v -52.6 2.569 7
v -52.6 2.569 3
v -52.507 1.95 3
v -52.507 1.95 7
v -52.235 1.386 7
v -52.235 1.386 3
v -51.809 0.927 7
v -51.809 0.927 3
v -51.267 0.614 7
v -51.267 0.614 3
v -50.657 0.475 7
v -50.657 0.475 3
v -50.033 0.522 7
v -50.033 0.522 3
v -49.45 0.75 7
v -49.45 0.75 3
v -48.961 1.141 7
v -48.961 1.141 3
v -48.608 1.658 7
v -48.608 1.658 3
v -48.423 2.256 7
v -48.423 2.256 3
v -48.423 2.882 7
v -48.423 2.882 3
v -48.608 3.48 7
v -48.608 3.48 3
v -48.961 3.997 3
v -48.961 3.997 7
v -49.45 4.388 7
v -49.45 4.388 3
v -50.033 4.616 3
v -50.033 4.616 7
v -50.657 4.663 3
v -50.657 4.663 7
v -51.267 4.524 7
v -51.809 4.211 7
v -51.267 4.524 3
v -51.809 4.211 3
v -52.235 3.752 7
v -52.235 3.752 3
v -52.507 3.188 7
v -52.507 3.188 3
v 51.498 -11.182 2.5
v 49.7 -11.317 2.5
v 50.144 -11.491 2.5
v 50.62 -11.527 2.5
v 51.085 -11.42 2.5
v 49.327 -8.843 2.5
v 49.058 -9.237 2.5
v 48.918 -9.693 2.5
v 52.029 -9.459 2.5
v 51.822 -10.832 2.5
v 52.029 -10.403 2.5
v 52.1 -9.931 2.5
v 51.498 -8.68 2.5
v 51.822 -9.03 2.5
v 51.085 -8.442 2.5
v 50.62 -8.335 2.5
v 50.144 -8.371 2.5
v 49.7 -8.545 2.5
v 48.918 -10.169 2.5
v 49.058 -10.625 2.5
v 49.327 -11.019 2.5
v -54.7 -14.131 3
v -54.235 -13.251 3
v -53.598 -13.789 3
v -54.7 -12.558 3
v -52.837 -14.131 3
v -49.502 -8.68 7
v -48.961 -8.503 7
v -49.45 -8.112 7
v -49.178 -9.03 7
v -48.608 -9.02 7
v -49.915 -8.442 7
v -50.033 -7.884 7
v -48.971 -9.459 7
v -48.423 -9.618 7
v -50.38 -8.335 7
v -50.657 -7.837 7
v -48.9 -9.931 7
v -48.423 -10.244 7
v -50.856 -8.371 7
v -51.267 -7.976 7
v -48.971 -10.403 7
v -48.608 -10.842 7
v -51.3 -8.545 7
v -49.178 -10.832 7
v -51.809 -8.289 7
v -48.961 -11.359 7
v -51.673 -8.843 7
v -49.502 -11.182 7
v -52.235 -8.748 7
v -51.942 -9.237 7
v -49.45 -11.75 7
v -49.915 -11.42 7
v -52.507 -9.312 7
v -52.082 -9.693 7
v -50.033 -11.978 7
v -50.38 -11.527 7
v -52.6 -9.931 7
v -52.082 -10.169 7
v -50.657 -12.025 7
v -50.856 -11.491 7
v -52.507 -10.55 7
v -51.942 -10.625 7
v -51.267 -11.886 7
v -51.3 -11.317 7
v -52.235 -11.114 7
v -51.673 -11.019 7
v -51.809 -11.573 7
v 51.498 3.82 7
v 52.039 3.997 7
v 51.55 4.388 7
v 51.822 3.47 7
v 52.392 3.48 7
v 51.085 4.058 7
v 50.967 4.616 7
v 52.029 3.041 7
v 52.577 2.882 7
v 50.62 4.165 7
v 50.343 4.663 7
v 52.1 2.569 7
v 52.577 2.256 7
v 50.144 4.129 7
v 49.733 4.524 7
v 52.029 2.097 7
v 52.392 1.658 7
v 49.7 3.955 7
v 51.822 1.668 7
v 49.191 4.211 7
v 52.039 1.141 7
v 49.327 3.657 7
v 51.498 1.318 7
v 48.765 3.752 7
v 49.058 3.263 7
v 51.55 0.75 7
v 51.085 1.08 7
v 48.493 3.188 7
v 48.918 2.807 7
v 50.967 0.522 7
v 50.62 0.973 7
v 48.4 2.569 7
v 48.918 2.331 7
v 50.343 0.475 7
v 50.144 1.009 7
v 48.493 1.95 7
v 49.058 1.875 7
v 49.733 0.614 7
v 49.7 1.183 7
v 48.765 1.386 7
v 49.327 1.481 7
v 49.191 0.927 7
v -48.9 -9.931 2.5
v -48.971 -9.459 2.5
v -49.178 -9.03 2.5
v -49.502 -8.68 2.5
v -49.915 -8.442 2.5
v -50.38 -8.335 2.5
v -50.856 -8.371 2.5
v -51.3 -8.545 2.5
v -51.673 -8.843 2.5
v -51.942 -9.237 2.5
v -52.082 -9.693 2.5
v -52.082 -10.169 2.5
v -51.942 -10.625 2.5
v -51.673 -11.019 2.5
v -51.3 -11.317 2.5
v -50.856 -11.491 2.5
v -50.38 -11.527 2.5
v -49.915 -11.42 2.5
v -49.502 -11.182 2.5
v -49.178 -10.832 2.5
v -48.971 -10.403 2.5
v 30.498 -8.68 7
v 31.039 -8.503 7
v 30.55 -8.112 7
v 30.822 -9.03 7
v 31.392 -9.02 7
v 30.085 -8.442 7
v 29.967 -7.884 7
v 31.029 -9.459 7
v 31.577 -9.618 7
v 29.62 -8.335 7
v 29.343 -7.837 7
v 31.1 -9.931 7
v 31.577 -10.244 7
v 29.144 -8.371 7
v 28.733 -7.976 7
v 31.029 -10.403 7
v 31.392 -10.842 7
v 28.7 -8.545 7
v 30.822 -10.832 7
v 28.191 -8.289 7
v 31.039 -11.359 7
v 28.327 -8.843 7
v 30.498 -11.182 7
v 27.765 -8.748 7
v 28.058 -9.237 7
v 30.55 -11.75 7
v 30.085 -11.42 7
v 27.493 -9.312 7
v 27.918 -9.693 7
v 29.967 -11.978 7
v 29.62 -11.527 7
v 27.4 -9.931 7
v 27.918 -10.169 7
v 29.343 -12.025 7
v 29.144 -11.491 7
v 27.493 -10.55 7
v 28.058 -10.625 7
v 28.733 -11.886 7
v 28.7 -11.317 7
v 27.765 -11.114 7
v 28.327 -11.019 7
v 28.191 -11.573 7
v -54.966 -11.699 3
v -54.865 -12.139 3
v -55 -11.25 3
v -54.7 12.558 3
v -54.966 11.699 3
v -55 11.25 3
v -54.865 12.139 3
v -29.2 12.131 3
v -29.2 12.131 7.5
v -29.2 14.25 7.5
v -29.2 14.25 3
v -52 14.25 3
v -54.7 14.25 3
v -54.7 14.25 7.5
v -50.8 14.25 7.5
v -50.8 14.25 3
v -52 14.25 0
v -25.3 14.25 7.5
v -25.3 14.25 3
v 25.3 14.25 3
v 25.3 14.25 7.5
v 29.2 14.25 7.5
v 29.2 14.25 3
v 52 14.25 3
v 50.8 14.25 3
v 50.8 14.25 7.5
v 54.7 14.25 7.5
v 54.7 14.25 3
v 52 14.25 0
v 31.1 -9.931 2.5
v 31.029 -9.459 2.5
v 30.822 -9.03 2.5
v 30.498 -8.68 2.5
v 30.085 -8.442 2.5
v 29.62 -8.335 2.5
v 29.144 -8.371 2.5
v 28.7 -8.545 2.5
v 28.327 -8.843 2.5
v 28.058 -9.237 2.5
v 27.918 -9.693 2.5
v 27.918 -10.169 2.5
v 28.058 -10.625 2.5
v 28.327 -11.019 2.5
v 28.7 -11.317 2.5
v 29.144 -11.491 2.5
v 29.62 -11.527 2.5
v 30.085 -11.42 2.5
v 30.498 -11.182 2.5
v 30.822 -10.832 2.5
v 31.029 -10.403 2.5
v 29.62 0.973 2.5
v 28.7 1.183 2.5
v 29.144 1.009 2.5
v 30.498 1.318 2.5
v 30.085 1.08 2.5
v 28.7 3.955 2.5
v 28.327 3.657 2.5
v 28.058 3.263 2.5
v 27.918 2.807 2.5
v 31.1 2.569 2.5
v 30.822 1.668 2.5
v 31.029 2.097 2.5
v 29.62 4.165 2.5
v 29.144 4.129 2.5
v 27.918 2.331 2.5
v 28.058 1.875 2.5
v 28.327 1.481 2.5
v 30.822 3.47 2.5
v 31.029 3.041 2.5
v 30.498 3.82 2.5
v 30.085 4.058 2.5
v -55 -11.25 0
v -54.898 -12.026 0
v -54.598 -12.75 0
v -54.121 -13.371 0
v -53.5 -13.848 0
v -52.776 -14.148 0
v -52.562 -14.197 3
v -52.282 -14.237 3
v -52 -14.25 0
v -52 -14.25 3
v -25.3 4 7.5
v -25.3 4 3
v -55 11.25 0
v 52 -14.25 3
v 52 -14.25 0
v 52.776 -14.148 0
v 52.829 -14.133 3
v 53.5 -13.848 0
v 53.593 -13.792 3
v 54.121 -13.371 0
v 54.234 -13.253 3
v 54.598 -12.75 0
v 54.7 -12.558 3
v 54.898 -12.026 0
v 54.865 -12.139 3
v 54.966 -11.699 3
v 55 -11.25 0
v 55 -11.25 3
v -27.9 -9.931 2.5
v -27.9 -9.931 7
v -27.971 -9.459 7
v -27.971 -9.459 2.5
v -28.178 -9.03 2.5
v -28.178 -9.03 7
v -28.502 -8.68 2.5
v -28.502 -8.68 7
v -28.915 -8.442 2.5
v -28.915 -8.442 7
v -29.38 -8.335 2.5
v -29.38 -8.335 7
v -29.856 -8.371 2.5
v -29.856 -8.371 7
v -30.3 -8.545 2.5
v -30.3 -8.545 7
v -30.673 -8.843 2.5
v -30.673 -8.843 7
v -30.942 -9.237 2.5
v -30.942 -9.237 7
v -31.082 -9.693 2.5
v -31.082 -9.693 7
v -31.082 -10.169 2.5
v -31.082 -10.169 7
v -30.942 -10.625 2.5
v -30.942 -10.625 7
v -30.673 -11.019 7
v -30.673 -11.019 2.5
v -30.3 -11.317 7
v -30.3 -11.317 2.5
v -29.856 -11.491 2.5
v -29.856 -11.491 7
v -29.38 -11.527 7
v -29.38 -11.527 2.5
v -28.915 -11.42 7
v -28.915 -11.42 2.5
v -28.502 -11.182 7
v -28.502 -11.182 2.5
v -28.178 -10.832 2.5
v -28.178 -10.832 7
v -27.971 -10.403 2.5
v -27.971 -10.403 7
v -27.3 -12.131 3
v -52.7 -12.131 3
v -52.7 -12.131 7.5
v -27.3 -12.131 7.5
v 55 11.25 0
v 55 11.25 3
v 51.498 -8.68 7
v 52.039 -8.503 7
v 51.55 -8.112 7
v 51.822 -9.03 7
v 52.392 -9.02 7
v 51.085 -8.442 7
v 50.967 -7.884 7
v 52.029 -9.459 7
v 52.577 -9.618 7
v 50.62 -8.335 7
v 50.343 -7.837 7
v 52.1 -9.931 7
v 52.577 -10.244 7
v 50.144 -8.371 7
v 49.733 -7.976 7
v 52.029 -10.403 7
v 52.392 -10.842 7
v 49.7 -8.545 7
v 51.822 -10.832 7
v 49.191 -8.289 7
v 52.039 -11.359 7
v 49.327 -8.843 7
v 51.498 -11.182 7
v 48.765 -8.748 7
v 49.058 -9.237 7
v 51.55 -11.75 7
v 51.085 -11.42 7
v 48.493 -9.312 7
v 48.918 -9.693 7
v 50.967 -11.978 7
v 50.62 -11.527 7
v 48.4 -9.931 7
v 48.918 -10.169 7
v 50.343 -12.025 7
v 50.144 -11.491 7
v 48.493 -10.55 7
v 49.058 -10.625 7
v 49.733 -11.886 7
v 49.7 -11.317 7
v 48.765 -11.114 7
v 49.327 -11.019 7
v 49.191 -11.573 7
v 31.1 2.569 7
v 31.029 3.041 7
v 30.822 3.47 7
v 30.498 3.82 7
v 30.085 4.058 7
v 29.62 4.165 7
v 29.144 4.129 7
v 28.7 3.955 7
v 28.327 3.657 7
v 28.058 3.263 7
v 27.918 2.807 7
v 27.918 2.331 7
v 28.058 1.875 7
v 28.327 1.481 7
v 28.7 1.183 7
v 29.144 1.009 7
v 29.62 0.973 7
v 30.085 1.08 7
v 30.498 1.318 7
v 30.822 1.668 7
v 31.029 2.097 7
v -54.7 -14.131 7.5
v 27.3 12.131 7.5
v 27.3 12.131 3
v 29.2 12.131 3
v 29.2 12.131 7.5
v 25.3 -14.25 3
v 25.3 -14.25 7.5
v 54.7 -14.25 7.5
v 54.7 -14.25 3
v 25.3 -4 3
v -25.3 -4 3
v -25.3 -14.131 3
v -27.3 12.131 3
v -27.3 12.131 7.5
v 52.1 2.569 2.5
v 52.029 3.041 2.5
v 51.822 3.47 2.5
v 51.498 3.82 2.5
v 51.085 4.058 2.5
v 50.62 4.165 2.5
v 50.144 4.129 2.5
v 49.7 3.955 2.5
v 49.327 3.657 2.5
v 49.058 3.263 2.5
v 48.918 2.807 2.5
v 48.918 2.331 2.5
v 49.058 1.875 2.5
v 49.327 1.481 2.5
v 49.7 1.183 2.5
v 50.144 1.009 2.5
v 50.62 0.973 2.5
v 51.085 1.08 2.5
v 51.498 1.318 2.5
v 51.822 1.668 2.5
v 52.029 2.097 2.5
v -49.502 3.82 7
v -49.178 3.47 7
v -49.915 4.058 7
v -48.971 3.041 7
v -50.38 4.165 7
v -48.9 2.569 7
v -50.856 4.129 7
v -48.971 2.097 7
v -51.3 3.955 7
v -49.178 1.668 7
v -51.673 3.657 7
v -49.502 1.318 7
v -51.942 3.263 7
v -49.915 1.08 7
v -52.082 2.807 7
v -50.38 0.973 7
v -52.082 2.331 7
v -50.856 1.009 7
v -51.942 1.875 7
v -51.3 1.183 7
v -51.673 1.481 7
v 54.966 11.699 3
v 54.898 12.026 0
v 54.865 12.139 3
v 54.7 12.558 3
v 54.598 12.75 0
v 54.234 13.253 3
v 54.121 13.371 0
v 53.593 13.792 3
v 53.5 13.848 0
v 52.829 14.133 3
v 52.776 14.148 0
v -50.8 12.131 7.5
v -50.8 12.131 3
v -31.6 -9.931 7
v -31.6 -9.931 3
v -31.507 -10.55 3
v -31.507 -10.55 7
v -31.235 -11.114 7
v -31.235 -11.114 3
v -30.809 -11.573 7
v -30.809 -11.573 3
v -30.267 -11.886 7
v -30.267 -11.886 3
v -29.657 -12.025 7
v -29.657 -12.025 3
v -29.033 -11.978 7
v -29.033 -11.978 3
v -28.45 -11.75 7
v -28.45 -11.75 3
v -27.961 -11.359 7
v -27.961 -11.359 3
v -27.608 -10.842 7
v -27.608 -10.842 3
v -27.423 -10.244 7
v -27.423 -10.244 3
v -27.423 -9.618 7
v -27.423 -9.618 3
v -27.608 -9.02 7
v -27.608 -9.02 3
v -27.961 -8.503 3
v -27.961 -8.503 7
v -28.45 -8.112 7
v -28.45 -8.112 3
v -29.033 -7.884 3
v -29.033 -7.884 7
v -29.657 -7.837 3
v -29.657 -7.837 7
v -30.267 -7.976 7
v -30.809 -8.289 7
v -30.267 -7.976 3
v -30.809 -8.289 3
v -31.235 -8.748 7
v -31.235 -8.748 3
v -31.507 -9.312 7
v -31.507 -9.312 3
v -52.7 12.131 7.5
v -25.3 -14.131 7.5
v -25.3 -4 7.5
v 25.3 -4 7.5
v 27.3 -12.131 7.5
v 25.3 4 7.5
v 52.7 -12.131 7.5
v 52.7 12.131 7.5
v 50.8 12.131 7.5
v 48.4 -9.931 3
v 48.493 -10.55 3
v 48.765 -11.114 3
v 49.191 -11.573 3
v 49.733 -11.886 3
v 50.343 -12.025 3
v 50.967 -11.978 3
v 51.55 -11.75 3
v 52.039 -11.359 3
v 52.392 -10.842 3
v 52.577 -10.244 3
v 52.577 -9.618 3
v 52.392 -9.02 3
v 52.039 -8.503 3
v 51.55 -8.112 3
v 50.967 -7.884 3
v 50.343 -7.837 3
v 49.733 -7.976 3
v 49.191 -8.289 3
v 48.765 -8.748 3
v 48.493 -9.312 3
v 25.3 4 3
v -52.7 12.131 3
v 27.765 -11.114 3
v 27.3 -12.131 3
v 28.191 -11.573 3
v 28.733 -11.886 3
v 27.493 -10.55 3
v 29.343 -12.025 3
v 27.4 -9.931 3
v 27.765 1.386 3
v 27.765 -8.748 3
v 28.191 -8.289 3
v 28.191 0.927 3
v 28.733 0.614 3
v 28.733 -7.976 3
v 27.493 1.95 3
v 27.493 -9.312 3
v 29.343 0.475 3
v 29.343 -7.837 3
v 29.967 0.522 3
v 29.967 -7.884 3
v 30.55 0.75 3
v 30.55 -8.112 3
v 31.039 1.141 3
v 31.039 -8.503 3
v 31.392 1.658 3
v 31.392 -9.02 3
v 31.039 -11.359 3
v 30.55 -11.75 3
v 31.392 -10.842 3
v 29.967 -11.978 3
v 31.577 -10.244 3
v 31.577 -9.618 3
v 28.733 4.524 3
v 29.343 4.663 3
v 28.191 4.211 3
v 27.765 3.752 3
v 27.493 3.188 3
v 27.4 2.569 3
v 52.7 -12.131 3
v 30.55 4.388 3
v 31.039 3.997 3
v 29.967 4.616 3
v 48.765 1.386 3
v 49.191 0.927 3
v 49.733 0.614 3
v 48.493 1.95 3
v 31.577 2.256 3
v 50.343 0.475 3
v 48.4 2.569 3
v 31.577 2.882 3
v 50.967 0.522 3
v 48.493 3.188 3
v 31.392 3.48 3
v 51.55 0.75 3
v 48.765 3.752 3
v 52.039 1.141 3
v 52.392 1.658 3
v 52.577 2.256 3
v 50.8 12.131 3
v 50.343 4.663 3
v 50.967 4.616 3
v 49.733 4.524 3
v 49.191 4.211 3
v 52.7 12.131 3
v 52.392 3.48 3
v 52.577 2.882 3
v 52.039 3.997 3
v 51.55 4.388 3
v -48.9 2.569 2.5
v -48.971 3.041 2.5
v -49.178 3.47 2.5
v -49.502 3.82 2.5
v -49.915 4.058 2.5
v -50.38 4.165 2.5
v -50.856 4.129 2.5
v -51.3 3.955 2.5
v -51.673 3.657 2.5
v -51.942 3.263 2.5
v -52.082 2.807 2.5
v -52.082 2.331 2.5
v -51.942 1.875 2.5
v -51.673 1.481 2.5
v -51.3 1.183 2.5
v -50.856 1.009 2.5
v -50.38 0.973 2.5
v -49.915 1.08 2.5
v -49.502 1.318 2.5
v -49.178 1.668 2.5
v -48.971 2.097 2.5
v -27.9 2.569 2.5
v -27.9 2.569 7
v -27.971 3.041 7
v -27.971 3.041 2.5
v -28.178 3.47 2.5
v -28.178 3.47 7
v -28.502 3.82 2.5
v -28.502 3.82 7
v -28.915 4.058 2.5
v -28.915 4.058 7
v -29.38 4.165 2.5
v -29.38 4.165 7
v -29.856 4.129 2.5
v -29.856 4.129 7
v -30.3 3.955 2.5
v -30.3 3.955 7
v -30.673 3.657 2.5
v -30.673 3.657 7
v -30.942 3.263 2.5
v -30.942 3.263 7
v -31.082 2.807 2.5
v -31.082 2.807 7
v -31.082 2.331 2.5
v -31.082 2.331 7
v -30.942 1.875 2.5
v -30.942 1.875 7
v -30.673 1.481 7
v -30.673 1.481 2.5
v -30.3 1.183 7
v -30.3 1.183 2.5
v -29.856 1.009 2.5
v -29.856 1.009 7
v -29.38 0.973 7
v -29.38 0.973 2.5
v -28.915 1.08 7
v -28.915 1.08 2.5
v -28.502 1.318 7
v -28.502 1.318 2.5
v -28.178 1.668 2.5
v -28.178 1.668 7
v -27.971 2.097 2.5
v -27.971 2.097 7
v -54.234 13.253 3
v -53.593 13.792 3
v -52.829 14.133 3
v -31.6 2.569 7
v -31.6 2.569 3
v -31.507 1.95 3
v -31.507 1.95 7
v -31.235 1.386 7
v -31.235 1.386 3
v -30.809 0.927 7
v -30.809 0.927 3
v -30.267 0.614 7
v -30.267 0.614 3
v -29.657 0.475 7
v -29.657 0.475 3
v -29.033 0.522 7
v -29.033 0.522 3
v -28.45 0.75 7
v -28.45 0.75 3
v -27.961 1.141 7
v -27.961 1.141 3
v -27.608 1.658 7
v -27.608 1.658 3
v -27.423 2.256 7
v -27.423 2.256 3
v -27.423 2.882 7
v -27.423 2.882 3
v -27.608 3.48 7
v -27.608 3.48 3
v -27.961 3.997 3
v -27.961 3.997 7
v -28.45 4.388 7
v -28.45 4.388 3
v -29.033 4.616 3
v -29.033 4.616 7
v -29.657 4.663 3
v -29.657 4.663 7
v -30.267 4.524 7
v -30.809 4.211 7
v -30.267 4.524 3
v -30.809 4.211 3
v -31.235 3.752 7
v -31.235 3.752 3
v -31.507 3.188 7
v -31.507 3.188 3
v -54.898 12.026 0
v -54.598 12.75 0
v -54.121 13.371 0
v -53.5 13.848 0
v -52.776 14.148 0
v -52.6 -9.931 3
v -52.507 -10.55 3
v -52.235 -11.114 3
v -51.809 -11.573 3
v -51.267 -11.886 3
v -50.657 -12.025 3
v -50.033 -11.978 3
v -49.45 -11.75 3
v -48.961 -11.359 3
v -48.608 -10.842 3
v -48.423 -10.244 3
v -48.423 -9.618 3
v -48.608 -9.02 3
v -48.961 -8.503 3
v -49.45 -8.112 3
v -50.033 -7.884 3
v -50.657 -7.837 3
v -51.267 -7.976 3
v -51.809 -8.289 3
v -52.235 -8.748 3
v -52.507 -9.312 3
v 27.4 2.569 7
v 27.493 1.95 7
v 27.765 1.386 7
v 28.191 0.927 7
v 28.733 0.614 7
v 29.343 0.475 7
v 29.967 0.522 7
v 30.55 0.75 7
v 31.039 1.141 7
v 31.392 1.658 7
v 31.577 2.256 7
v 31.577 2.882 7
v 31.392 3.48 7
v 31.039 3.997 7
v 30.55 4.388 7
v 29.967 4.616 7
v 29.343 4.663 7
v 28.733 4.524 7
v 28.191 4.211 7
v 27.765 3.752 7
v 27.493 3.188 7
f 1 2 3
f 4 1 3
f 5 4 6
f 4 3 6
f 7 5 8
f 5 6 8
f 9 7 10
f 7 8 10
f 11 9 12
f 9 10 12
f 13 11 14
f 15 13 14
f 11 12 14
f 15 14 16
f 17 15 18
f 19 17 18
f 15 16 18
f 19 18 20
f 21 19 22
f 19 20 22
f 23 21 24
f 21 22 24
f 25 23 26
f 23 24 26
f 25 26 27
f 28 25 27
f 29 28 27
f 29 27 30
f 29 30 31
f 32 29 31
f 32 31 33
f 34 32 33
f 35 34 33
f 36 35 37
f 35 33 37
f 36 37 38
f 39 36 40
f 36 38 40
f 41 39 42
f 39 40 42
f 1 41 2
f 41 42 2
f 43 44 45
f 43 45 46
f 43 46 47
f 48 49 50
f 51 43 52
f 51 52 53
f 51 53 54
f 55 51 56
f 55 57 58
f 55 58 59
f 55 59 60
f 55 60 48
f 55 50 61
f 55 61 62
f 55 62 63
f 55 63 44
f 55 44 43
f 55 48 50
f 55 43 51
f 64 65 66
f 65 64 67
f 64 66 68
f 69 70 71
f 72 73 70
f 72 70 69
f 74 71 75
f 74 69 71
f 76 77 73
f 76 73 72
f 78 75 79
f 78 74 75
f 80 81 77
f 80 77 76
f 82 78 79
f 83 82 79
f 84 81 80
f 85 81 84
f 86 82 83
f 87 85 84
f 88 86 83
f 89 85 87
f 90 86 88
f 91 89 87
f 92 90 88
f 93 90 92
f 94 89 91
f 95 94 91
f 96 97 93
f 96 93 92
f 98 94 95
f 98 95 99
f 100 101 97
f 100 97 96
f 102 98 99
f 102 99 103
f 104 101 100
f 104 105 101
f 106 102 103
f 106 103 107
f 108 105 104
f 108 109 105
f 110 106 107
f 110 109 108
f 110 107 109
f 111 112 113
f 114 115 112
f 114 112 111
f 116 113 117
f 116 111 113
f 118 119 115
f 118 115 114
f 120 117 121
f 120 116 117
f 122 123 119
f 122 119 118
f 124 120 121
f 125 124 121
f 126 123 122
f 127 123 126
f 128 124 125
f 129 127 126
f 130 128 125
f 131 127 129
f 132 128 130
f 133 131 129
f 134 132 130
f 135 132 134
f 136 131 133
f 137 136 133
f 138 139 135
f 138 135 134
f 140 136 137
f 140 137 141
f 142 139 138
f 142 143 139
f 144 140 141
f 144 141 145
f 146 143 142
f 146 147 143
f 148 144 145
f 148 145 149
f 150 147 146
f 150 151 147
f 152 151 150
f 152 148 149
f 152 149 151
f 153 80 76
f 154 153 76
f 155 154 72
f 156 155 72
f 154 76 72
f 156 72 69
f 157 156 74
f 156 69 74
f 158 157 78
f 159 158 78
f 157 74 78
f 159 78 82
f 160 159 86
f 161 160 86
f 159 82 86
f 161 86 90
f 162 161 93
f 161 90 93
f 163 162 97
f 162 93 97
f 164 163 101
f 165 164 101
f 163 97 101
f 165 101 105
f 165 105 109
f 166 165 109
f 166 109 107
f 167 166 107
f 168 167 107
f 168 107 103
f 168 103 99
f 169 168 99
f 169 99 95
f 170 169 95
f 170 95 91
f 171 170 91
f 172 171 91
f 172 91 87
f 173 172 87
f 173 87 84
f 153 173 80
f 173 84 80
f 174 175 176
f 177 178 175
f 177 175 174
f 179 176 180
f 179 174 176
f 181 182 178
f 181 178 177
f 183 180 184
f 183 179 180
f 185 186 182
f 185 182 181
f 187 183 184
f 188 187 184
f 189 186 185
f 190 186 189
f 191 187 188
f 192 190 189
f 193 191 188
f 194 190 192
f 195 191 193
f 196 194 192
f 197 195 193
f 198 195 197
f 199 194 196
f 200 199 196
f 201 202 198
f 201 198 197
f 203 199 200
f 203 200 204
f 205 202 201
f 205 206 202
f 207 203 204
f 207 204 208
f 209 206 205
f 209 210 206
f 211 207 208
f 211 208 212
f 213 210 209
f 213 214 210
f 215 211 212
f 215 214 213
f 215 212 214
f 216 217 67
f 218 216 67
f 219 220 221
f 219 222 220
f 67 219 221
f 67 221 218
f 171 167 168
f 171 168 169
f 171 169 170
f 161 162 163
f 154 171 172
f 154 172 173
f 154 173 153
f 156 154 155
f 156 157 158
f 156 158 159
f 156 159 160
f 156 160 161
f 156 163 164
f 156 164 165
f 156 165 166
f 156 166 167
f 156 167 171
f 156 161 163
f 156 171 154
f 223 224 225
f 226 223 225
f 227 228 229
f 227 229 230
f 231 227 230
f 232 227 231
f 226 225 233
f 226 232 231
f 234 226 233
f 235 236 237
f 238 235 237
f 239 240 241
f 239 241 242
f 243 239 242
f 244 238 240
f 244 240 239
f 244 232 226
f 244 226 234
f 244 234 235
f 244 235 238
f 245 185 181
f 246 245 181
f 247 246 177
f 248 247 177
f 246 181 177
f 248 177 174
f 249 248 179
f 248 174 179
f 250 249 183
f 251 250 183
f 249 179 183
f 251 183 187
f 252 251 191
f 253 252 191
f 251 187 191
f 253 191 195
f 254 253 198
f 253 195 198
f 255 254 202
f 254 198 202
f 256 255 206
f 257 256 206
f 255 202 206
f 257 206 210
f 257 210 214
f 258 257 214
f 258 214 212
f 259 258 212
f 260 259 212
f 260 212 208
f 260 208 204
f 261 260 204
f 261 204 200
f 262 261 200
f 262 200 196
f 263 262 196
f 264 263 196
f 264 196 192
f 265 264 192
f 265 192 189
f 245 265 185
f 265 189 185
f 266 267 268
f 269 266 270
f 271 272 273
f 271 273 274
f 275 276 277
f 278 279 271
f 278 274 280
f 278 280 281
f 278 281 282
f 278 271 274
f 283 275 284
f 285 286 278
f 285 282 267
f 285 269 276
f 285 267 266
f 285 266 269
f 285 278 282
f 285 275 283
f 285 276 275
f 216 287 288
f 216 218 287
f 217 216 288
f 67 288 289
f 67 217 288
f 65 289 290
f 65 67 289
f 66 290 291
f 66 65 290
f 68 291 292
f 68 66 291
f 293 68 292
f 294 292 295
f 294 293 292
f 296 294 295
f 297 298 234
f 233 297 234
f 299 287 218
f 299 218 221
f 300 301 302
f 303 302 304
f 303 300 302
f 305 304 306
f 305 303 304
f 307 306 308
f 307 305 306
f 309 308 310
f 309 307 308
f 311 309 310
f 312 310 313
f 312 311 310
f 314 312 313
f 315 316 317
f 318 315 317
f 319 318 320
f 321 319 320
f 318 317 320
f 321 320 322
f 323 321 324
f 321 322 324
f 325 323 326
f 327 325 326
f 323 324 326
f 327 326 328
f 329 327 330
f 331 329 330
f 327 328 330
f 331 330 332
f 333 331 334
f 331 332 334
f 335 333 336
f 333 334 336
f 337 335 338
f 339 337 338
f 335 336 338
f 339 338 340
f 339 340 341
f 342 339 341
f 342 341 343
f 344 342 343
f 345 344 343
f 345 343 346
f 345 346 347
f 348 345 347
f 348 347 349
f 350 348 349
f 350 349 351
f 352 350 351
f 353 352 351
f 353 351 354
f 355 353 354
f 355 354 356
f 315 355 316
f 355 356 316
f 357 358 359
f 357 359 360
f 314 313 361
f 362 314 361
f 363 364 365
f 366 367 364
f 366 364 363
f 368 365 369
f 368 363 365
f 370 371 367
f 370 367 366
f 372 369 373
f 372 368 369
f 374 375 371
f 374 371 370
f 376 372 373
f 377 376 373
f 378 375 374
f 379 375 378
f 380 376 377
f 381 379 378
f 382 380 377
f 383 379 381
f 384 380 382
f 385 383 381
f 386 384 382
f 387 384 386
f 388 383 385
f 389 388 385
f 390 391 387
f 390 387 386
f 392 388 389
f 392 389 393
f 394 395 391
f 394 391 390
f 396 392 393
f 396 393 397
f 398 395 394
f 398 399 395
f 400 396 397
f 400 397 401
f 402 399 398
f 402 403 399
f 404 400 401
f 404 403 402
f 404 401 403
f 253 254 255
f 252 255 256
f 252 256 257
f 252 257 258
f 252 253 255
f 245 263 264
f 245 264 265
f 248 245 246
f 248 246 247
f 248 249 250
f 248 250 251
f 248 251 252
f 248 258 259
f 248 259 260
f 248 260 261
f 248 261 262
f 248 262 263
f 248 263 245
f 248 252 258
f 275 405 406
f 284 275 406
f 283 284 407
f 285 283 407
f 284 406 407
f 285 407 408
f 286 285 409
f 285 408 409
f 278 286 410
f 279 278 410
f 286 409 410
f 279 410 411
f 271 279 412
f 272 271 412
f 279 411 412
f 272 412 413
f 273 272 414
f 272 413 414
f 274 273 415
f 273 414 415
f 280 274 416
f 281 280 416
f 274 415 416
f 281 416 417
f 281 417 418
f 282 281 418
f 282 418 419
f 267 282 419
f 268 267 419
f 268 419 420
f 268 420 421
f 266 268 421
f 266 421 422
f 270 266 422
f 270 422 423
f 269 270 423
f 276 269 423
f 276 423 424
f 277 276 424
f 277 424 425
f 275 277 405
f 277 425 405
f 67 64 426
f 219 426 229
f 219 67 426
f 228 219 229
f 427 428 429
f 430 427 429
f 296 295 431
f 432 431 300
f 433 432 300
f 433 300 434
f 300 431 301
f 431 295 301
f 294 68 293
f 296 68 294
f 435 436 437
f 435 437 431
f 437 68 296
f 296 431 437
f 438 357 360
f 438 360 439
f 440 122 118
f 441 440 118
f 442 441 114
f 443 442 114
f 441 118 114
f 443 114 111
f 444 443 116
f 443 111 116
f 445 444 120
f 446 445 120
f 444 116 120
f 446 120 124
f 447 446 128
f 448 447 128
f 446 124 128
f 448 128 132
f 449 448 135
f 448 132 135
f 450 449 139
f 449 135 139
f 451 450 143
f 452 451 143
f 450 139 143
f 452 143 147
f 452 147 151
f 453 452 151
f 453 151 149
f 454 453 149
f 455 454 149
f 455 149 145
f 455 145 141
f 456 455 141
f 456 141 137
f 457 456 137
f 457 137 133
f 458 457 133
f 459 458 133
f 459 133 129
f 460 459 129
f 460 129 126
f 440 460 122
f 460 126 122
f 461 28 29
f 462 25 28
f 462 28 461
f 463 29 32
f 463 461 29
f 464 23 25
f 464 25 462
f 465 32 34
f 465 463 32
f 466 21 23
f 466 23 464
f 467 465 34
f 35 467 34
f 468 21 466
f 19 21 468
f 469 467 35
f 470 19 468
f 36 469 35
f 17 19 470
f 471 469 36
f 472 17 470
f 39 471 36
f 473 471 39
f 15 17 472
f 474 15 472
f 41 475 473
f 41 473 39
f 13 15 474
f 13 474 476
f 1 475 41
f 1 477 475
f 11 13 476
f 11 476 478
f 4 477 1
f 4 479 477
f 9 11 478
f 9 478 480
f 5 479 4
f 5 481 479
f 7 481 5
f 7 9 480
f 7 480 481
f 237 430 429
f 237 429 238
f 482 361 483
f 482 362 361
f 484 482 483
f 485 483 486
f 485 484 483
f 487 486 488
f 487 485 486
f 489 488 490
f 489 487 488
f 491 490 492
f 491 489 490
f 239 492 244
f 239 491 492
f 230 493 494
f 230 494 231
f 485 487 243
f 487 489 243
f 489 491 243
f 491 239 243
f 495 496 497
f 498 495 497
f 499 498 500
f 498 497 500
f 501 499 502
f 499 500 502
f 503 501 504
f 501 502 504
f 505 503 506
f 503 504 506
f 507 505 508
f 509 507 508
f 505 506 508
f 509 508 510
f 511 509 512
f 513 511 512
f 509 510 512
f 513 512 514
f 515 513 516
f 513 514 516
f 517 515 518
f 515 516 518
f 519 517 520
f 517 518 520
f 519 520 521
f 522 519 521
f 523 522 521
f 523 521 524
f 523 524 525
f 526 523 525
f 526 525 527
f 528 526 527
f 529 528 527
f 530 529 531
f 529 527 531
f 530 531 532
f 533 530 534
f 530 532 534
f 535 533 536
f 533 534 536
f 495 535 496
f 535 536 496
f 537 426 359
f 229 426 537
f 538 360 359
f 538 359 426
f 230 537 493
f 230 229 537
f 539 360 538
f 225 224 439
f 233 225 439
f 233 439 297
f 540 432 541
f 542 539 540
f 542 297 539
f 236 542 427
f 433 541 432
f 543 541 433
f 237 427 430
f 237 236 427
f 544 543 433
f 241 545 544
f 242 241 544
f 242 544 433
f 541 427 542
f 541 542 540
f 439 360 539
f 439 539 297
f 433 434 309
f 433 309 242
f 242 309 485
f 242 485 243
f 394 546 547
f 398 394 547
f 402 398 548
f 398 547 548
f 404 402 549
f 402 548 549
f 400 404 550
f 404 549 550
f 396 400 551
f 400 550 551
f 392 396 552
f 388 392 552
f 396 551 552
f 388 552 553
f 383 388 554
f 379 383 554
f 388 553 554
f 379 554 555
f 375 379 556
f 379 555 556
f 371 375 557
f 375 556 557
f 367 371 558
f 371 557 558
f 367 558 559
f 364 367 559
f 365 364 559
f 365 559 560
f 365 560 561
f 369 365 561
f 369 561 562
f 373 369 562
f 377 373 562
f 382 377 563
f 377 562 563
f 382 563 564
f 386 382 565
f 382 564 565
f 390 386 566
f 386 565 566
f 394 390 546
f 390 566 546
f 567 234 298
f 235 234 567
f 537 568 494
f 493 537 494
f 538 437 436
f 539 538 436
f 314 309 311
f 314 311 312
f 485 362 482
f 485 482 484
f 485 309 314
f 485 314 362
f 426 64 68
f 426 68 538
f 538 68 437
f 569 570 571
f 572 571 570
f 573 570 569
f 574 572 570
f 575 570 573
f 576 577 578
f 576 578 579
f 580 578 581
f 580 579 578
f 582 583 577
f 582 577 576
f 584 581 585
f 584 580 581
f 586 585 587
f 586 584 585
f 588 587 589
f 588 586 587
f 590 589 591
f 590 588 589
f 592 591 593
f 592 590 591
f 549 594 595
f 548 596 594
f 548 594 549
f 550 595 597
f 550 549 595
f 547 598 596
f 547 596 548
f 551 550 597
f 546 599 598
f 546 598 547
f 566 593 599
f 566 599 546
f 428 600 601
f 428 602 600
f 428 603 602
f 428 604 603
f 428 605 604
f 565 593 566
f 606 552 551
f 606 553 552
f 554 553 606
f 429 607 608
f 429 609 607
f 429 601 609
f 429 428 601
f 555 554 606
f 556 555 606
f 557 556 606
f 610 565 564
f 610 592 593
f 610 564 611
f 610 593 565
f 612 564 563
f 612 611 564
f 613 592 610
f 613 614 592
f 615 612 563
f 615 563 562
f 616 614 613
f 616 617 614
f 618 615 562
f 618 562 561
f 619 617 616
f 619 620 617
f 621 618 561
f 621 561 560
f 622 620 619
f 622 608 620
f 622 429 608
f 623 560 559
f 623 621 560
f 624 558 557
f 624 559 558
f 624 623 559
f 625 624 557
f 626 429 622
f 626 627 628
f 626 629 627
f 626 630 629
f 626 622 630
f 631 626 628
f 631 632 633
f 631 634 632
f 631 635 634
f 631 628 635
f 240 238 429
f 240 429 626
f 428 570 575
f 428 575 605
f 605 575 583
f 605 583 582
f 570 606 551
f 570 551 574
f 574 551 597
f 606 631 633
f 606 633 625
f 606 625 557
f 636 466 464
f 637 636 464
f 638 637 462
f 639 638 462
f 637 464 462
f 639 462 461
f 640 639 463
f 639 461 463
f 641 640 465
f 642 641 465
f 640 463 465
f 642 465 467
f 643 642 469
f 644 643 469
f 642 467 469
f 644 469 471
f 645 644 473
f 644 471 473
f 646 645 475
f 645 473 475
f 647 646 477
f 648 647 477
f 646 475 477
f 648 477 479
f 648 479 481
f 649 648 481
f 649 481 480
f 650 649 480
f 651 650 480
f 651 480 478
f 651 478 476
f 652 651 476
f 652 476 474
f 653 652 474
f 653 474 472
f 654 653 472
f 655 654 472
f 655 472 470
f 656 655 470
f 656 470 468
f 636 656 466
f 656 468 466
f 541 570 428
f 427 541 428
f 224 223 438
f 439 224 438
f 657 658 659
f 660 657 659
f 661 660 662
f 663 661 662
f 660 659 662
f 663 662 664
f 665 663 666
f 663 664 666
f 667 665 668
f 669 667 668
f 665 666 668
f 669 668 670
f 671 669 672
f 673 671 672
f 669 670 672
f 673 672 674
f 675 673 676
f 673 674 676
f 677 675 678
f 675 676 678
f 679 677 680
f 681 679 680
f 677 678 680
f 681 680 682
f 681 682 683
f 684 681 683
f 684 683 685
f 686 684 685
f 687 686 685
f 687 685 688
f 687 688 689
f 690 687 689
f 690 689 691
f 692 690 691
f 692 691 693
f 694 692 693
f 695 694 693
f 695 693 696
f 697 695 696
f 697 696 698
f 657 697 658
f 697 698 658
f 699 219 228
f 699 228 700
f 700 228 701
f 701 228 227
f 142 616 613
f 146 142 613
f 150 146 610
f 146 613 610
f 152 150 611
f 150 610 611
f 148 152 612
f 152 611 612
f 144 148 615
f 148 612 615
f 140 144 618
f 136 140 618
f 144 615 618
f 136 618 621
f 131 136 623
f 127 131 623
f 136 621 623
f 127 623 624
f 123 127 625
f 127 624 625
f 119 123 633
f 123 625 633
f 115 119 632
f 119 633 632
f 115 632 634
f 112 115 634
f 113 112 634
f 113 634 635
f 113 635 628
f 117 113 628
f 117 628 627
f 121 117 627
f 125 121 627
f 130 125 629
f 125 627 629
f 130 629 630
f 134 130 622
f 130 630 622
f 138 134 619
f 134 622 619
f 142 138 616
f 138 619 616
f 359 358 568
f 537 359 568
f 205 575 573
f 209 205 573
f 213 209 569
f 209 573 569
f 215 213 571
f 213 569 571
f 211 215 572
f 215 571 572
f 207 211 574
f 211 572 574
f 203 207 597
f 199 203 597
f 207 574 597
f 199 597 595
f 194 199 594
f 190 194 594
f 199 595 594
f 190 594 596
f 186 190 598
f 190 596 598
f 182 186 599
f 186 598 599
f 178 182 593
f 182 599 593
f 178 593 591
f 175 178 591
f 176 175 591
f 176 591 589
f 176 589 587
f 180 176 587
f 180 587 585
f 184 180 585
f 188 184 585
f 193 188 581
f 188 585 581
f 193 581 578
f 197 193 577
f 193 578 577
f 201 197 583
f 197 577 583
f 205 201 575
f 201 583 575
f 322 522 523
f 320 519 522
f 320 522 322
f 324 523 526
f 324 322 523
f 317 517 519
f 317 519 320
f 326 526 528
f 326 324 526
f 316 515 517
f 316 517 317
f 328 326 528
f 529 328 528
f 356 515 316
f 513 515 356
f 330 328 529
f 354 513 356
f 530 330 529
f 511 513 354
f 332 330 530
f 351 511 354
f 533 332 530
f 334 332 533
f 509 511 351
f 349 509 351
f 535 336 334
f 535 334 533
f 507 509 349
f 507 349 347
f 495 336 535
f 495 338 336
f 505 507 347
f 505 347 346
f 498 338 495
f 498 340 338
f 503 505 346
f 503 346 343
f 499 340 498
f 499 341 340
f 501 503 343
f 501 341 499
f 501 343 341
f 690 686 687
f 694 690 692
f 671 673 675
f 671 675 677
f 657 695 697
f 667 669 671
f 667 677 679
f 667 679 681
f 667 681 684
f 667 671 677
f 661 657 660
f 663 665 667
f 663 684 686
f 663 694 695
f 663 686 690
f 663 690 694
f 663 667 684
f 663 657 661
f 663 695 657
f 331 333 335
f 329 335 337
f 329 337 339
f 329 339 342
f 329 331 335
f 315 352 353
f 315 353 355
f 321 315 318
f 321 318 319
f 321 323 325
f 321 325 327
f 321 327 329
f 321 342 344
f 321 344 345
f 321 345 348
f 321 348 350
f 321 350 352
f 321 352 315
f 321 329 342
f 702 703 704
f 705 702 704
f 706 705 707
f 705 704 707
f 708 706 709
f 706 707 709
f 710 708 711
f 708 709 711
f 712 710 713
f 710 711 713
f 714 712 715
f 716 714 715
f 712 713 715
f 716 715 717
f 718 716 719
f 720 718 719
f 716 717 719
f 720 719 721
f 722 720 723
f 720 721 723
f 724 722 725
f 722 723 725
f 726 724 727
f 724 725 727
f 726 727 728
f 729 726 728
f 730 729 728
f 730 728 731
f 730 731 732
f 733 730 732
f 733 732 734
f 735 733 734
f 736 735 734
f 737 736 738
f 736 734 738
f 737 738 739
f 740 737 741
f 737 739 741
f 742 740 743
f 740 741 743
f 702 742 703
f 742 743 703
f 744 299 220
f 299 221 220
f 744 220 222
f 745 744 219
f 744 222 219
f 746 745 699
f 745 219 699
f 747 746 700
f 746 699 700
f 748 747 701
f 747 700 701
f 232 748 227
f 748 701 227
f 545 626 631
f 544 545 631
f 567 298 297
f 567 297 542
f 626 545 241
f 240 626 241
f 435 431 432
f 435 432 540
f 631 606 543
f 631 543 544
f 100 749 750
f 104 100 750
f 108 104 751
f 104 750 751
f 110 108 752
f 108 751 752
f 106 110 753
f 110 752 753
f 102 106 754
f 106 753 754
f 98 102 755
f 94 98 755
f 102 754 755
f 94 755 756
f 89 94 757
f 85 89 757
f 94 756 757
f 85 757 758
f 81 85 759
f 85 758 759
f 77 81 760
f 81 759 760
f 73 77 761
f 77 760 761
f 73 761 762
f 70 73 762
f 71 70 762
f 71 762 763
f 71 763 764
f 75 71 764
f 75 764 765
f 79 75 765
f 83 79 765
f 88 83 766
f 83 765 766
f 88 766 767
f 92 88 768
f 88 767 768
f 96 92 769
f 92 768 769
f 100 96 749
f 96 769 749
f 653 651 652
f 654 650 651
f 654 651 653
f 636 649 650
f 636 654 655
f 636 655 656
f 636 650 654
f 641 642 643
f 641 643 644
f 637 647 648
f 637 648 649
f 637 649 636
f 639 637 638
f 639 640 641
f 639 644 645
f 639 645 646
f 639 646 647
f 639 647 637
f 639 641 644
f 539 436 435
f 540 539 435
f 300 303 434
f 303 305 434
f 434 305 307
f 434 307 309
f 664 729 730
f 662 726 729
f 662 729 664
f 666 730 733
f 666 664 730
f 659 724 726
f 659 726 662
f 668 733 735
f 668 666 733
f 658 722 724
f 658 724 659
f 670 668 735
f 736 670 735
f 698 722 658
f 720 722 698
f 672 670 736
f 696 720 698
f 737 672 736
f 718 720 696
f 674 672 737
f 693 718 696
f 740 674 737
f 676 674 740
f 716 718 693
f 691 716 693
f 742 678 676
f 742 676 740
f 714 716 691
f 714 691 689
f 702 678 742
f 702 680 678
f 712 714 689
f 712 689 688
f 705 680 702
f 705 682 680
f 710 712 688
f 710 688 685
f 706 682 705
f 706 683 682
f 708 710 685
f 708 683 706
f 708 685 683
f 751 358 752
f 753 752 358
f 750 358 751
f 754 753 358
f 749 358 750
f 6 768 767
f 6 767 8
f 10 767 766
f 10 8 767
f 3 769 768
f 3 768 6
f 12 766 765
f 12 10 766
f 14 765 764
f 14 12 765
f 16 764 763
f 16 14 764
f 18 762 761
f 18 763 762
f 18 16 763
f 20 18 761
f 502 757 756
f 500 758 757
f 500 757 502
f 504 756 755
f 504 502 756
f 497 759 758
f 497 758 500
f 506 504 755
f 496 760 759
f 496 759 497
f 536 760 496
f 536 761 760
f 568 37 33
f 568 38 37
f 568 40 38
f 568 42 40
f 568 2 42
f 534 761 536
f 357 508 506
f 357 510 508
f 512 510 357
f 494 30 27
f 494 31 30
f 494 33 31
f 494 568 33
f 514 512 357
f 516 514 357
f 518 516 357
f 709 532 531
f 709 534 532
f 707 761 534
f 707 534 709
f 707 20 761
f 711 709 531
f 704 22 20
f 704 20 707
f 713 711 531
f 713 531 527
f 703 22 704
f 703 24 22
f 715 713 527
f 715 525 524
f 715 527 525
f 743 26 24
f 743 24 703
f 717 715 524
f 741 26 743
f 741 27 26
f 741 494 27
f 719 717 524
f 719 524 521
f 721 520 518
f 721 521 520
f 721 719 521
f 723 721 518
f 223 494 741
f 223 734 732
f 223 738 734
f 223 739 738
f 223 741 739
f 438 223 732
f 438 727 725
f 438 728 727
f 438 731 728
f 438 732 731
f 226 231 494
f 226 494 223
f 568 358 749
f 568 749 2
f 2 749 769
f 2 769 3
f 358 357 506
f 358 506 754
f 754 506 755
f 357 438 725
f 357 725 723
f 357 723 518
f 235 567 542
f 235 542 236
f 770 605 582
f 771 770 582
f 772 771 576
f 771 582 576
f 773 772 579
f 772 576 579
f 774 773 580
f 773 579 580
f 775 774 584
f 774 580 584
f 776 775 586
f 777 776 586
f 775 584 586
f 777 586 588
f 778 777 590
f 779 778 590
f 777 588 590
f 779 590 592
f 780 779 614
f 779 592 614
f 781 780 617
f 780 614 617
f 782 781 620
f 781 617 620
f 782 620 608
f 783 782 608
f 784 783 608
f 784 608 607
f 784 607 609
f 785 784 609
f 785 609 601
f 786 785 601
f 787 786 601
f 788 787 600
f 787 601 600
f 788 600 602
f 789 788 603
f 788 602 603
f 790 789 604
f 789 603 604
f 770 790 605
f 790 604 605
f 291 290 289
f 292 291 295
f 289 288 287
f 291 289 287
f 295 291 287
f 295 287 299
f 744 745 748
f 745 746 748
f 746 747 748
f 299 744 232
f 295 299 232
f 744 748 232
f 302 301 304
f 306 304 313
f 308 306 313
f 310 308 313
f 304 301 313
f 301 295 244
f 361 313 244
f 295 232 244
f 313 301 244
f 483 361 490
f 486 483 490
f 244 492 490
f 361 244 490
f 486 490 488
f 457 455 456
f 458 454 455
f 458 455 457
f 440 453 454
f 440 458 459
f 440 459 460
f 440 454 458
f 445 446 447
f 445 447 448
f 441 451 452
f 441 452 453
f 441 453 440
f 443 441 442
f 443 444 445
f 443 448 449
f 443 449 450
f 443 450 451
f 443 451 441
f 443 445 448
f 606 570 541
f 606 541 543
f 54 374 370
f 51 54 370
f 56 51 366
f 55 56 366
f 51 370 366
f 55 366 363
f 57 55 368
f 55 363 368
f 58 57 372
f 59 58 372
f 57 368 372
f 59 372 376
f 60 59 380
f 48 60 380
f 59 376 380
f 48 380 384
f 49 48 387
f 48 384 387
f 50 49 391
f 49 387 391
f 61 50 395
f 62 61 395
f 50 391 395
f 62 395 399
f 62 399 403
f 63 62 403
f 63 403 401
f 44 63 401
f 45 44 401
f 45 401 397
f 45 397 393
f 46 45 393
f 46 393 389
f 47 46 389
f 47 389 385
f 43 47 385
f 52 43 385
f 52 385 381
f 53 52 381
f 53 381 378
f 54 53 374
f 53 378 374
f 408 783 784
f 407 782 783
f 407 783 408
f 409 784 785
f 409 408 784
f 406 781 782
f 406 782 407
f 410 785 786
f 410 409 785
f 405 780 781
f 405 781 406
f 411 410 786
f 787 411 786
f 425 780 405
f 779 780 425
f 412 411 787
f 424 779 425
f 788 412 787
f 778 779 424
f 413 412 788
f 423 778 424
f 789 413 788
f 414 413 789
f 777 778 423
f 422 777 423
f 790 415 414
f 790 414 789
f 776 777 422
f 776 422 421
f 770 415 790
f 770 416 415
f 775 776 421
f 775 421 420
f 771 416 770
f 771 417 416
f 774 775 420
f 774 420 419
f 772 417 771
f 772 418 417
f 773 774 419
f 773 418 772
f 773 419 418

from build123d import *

# Parameters (mm, degrees)
SKETCH1_W                  = 110
SKETCH1_H                  = 28.5
BACKPLATE_BASE_DEPTH       = 3
OUTER_CORNER_FILLETS_R     = 3
SKETCH2_W                  = 29.4
SKETCH2_H                  = 28.381
SKETCH2_W_2                = 25.4
SKETCH2_H_2                = 24.262
SKETCH2_H_3                = 28.5
POCKET_WALLS_DEPTH         = 4.5
SKETCH3_W                  = 50.6
SKETCH3_H                  = 8
CENTER_BRIDGE_DEPTH        = 4.5
SKETCH4_W                  = 21.6
SKETCH4_H                  = 3
CSI_CABLE_EXIT_SLOTS_DEPTH = 4.5
STANDOFF_BOSSES_START      = 3
SKETCH5_R                  = 2.1
STANDOFF_BOSSES_DEPTH      = 4
SKETCH6_R                  = 1.6
M2_INSERT_HOLES_DEPTH      = 4.5


with BuildPart() as part:
    # Sketch1 → Backplate_Base (new body)
    with BuildSketch(Plane.XY):
        Rectangle(SKETCH1_W, SKETCH1_H)
    extrude(amount=BACKPLATE_BASE_DEPTH)

    # Outer_Corner_Fillets
    outer_corner_fillets_edges = [part.edges().sort_by_distance(p)[0] for p in [
        (-55, 14.25, 1.5),
        (55, 14.25, 1.5),
        (55, -14.25, 1.5),
        (-55, -14.25, 1.5),
    ]]
    fillet(outer_corner_fillets_edges, radius=OUTER_CORNER_FILLETS_R)

    # Sketch2 → Pocket_Walls (add)
    # profile 1 of 2: a face of its own
    with BuildSketch(Plane.XY.offset(3)):
        with Locations((-40, 0.0595)):
            Rectangle(SKETCH2_W, SKETCH2_H)
        with Locations((-40, 0)):
            Rectangle(SKETCH2_W_2, SKETCH2_H_2, mode=Mode.SUBTRACT)
    # profile 2 of 2: a face of its own
    with BuildSketch(Plane.XY.offset(3)):
        with Locations((40, 0)):
            Rectangle(SKETCH2_W, SKETCH2_H_3)
        with Locations((40, 0)):
            Rectangle(SKETCH2_W_2, SKETCH2_H_2, mode=Mode.SUBTRACT)
    extrude(amount=POCKET_WALLS_DEPTH)

    # Sketch3 → Center_Bridge (add)
    with BuildSketch(Plane.XY.offset(3)):
        Rectangle(SKETCH3_W, SKETCH3_H)
    extrude(amount=CENTER_BRIDGE_DEPTH)

    # Sketch4 → CSI_Cable_Exit_Slots (cut)
    with BuildSketch(Plane.XY.offset(7.5)):
        with Locations((-40, 13.131)):
            Rectangle(SKETCH4_W, SKETCH4_H)
        with Locations((40, 13.131)):
            Rectangle(SKETCH4_W, SKETCH4_H)
    extrude(amount=-CSI_CABLE_EXIT_SLOTS_DEPTH, mode=Mode.SUBTRACT)

    # Sketch5 → Standoff_Bosses (add)
    with BuildSketch(Plane.XY.offset(STANDOFF_BOSSES_START)):
        with Locations(Location((-50.5, -9.931, 0), (0, 0, 180))):
            Circle(SKETCH5_R)
        with Locations(Location((-29.5, -9.931, 0), (0, 0, 180))):
            Circle(SKETCH5_R)
        with Locations(Location((-50.5, 2.569, 0), (0, 0, 180))):
            Circle(SKETCH5_R)
        with Locations(Location((-29.5, 2.569, 0), (0, 0, 180))):
            Circle(SKETCH5_R)
        with Locations(Location((29.5, -9.931, 0), (0, 0, 180))):
            Circle(SKETCH5_R)
        with Locations(Location((50.5, -9.931, 0), (0, 0, 180))):
            Circle(SKETCH5_R)
        with Locations(Location((29.5, 2.569, 0), (0, 0, 180))):
            Circle(SKETCH5_R)
        with Locations(Location((50.5, 2.569, 0), (0, 0, 180))):
            Circle(SKETCH5_R)
    extrude(amount=STANDOFF_BOSSES_DEPTH)

    # Sketch6 → M2_Insert_Holes (cut)
    with BuildSketch(Plane.XY.offset(7)):
        with Locations((-50.5, -9.931)):
            Circle(SKETCH6_R)
        with Locations((-29.5, -9.931)):
            Circle(SKETCH6_R)
        with Locations((-50.5, 2.569)):
            Circle(SKETCH6_R)
        with Locations((-29.5, 2.569)):
            Circle(SKETCH6_R)
        with Locations((29.5, -9.931)):
            Circle(SKETCH6_R)
        with Locations((50.5, -9.931)):
            Circle(SKETCH6_R)
        with Locations((29.5, 2.569)):
            Circle(SKETCH6_R)
        with Locations((50.5, 2.569)):
            Circle(SKETCH6_R)
    extrude(amount=-M2_INSERT_HOLES_DEPTH, mode=Mode.SUBTRACT)


solid = part.part
